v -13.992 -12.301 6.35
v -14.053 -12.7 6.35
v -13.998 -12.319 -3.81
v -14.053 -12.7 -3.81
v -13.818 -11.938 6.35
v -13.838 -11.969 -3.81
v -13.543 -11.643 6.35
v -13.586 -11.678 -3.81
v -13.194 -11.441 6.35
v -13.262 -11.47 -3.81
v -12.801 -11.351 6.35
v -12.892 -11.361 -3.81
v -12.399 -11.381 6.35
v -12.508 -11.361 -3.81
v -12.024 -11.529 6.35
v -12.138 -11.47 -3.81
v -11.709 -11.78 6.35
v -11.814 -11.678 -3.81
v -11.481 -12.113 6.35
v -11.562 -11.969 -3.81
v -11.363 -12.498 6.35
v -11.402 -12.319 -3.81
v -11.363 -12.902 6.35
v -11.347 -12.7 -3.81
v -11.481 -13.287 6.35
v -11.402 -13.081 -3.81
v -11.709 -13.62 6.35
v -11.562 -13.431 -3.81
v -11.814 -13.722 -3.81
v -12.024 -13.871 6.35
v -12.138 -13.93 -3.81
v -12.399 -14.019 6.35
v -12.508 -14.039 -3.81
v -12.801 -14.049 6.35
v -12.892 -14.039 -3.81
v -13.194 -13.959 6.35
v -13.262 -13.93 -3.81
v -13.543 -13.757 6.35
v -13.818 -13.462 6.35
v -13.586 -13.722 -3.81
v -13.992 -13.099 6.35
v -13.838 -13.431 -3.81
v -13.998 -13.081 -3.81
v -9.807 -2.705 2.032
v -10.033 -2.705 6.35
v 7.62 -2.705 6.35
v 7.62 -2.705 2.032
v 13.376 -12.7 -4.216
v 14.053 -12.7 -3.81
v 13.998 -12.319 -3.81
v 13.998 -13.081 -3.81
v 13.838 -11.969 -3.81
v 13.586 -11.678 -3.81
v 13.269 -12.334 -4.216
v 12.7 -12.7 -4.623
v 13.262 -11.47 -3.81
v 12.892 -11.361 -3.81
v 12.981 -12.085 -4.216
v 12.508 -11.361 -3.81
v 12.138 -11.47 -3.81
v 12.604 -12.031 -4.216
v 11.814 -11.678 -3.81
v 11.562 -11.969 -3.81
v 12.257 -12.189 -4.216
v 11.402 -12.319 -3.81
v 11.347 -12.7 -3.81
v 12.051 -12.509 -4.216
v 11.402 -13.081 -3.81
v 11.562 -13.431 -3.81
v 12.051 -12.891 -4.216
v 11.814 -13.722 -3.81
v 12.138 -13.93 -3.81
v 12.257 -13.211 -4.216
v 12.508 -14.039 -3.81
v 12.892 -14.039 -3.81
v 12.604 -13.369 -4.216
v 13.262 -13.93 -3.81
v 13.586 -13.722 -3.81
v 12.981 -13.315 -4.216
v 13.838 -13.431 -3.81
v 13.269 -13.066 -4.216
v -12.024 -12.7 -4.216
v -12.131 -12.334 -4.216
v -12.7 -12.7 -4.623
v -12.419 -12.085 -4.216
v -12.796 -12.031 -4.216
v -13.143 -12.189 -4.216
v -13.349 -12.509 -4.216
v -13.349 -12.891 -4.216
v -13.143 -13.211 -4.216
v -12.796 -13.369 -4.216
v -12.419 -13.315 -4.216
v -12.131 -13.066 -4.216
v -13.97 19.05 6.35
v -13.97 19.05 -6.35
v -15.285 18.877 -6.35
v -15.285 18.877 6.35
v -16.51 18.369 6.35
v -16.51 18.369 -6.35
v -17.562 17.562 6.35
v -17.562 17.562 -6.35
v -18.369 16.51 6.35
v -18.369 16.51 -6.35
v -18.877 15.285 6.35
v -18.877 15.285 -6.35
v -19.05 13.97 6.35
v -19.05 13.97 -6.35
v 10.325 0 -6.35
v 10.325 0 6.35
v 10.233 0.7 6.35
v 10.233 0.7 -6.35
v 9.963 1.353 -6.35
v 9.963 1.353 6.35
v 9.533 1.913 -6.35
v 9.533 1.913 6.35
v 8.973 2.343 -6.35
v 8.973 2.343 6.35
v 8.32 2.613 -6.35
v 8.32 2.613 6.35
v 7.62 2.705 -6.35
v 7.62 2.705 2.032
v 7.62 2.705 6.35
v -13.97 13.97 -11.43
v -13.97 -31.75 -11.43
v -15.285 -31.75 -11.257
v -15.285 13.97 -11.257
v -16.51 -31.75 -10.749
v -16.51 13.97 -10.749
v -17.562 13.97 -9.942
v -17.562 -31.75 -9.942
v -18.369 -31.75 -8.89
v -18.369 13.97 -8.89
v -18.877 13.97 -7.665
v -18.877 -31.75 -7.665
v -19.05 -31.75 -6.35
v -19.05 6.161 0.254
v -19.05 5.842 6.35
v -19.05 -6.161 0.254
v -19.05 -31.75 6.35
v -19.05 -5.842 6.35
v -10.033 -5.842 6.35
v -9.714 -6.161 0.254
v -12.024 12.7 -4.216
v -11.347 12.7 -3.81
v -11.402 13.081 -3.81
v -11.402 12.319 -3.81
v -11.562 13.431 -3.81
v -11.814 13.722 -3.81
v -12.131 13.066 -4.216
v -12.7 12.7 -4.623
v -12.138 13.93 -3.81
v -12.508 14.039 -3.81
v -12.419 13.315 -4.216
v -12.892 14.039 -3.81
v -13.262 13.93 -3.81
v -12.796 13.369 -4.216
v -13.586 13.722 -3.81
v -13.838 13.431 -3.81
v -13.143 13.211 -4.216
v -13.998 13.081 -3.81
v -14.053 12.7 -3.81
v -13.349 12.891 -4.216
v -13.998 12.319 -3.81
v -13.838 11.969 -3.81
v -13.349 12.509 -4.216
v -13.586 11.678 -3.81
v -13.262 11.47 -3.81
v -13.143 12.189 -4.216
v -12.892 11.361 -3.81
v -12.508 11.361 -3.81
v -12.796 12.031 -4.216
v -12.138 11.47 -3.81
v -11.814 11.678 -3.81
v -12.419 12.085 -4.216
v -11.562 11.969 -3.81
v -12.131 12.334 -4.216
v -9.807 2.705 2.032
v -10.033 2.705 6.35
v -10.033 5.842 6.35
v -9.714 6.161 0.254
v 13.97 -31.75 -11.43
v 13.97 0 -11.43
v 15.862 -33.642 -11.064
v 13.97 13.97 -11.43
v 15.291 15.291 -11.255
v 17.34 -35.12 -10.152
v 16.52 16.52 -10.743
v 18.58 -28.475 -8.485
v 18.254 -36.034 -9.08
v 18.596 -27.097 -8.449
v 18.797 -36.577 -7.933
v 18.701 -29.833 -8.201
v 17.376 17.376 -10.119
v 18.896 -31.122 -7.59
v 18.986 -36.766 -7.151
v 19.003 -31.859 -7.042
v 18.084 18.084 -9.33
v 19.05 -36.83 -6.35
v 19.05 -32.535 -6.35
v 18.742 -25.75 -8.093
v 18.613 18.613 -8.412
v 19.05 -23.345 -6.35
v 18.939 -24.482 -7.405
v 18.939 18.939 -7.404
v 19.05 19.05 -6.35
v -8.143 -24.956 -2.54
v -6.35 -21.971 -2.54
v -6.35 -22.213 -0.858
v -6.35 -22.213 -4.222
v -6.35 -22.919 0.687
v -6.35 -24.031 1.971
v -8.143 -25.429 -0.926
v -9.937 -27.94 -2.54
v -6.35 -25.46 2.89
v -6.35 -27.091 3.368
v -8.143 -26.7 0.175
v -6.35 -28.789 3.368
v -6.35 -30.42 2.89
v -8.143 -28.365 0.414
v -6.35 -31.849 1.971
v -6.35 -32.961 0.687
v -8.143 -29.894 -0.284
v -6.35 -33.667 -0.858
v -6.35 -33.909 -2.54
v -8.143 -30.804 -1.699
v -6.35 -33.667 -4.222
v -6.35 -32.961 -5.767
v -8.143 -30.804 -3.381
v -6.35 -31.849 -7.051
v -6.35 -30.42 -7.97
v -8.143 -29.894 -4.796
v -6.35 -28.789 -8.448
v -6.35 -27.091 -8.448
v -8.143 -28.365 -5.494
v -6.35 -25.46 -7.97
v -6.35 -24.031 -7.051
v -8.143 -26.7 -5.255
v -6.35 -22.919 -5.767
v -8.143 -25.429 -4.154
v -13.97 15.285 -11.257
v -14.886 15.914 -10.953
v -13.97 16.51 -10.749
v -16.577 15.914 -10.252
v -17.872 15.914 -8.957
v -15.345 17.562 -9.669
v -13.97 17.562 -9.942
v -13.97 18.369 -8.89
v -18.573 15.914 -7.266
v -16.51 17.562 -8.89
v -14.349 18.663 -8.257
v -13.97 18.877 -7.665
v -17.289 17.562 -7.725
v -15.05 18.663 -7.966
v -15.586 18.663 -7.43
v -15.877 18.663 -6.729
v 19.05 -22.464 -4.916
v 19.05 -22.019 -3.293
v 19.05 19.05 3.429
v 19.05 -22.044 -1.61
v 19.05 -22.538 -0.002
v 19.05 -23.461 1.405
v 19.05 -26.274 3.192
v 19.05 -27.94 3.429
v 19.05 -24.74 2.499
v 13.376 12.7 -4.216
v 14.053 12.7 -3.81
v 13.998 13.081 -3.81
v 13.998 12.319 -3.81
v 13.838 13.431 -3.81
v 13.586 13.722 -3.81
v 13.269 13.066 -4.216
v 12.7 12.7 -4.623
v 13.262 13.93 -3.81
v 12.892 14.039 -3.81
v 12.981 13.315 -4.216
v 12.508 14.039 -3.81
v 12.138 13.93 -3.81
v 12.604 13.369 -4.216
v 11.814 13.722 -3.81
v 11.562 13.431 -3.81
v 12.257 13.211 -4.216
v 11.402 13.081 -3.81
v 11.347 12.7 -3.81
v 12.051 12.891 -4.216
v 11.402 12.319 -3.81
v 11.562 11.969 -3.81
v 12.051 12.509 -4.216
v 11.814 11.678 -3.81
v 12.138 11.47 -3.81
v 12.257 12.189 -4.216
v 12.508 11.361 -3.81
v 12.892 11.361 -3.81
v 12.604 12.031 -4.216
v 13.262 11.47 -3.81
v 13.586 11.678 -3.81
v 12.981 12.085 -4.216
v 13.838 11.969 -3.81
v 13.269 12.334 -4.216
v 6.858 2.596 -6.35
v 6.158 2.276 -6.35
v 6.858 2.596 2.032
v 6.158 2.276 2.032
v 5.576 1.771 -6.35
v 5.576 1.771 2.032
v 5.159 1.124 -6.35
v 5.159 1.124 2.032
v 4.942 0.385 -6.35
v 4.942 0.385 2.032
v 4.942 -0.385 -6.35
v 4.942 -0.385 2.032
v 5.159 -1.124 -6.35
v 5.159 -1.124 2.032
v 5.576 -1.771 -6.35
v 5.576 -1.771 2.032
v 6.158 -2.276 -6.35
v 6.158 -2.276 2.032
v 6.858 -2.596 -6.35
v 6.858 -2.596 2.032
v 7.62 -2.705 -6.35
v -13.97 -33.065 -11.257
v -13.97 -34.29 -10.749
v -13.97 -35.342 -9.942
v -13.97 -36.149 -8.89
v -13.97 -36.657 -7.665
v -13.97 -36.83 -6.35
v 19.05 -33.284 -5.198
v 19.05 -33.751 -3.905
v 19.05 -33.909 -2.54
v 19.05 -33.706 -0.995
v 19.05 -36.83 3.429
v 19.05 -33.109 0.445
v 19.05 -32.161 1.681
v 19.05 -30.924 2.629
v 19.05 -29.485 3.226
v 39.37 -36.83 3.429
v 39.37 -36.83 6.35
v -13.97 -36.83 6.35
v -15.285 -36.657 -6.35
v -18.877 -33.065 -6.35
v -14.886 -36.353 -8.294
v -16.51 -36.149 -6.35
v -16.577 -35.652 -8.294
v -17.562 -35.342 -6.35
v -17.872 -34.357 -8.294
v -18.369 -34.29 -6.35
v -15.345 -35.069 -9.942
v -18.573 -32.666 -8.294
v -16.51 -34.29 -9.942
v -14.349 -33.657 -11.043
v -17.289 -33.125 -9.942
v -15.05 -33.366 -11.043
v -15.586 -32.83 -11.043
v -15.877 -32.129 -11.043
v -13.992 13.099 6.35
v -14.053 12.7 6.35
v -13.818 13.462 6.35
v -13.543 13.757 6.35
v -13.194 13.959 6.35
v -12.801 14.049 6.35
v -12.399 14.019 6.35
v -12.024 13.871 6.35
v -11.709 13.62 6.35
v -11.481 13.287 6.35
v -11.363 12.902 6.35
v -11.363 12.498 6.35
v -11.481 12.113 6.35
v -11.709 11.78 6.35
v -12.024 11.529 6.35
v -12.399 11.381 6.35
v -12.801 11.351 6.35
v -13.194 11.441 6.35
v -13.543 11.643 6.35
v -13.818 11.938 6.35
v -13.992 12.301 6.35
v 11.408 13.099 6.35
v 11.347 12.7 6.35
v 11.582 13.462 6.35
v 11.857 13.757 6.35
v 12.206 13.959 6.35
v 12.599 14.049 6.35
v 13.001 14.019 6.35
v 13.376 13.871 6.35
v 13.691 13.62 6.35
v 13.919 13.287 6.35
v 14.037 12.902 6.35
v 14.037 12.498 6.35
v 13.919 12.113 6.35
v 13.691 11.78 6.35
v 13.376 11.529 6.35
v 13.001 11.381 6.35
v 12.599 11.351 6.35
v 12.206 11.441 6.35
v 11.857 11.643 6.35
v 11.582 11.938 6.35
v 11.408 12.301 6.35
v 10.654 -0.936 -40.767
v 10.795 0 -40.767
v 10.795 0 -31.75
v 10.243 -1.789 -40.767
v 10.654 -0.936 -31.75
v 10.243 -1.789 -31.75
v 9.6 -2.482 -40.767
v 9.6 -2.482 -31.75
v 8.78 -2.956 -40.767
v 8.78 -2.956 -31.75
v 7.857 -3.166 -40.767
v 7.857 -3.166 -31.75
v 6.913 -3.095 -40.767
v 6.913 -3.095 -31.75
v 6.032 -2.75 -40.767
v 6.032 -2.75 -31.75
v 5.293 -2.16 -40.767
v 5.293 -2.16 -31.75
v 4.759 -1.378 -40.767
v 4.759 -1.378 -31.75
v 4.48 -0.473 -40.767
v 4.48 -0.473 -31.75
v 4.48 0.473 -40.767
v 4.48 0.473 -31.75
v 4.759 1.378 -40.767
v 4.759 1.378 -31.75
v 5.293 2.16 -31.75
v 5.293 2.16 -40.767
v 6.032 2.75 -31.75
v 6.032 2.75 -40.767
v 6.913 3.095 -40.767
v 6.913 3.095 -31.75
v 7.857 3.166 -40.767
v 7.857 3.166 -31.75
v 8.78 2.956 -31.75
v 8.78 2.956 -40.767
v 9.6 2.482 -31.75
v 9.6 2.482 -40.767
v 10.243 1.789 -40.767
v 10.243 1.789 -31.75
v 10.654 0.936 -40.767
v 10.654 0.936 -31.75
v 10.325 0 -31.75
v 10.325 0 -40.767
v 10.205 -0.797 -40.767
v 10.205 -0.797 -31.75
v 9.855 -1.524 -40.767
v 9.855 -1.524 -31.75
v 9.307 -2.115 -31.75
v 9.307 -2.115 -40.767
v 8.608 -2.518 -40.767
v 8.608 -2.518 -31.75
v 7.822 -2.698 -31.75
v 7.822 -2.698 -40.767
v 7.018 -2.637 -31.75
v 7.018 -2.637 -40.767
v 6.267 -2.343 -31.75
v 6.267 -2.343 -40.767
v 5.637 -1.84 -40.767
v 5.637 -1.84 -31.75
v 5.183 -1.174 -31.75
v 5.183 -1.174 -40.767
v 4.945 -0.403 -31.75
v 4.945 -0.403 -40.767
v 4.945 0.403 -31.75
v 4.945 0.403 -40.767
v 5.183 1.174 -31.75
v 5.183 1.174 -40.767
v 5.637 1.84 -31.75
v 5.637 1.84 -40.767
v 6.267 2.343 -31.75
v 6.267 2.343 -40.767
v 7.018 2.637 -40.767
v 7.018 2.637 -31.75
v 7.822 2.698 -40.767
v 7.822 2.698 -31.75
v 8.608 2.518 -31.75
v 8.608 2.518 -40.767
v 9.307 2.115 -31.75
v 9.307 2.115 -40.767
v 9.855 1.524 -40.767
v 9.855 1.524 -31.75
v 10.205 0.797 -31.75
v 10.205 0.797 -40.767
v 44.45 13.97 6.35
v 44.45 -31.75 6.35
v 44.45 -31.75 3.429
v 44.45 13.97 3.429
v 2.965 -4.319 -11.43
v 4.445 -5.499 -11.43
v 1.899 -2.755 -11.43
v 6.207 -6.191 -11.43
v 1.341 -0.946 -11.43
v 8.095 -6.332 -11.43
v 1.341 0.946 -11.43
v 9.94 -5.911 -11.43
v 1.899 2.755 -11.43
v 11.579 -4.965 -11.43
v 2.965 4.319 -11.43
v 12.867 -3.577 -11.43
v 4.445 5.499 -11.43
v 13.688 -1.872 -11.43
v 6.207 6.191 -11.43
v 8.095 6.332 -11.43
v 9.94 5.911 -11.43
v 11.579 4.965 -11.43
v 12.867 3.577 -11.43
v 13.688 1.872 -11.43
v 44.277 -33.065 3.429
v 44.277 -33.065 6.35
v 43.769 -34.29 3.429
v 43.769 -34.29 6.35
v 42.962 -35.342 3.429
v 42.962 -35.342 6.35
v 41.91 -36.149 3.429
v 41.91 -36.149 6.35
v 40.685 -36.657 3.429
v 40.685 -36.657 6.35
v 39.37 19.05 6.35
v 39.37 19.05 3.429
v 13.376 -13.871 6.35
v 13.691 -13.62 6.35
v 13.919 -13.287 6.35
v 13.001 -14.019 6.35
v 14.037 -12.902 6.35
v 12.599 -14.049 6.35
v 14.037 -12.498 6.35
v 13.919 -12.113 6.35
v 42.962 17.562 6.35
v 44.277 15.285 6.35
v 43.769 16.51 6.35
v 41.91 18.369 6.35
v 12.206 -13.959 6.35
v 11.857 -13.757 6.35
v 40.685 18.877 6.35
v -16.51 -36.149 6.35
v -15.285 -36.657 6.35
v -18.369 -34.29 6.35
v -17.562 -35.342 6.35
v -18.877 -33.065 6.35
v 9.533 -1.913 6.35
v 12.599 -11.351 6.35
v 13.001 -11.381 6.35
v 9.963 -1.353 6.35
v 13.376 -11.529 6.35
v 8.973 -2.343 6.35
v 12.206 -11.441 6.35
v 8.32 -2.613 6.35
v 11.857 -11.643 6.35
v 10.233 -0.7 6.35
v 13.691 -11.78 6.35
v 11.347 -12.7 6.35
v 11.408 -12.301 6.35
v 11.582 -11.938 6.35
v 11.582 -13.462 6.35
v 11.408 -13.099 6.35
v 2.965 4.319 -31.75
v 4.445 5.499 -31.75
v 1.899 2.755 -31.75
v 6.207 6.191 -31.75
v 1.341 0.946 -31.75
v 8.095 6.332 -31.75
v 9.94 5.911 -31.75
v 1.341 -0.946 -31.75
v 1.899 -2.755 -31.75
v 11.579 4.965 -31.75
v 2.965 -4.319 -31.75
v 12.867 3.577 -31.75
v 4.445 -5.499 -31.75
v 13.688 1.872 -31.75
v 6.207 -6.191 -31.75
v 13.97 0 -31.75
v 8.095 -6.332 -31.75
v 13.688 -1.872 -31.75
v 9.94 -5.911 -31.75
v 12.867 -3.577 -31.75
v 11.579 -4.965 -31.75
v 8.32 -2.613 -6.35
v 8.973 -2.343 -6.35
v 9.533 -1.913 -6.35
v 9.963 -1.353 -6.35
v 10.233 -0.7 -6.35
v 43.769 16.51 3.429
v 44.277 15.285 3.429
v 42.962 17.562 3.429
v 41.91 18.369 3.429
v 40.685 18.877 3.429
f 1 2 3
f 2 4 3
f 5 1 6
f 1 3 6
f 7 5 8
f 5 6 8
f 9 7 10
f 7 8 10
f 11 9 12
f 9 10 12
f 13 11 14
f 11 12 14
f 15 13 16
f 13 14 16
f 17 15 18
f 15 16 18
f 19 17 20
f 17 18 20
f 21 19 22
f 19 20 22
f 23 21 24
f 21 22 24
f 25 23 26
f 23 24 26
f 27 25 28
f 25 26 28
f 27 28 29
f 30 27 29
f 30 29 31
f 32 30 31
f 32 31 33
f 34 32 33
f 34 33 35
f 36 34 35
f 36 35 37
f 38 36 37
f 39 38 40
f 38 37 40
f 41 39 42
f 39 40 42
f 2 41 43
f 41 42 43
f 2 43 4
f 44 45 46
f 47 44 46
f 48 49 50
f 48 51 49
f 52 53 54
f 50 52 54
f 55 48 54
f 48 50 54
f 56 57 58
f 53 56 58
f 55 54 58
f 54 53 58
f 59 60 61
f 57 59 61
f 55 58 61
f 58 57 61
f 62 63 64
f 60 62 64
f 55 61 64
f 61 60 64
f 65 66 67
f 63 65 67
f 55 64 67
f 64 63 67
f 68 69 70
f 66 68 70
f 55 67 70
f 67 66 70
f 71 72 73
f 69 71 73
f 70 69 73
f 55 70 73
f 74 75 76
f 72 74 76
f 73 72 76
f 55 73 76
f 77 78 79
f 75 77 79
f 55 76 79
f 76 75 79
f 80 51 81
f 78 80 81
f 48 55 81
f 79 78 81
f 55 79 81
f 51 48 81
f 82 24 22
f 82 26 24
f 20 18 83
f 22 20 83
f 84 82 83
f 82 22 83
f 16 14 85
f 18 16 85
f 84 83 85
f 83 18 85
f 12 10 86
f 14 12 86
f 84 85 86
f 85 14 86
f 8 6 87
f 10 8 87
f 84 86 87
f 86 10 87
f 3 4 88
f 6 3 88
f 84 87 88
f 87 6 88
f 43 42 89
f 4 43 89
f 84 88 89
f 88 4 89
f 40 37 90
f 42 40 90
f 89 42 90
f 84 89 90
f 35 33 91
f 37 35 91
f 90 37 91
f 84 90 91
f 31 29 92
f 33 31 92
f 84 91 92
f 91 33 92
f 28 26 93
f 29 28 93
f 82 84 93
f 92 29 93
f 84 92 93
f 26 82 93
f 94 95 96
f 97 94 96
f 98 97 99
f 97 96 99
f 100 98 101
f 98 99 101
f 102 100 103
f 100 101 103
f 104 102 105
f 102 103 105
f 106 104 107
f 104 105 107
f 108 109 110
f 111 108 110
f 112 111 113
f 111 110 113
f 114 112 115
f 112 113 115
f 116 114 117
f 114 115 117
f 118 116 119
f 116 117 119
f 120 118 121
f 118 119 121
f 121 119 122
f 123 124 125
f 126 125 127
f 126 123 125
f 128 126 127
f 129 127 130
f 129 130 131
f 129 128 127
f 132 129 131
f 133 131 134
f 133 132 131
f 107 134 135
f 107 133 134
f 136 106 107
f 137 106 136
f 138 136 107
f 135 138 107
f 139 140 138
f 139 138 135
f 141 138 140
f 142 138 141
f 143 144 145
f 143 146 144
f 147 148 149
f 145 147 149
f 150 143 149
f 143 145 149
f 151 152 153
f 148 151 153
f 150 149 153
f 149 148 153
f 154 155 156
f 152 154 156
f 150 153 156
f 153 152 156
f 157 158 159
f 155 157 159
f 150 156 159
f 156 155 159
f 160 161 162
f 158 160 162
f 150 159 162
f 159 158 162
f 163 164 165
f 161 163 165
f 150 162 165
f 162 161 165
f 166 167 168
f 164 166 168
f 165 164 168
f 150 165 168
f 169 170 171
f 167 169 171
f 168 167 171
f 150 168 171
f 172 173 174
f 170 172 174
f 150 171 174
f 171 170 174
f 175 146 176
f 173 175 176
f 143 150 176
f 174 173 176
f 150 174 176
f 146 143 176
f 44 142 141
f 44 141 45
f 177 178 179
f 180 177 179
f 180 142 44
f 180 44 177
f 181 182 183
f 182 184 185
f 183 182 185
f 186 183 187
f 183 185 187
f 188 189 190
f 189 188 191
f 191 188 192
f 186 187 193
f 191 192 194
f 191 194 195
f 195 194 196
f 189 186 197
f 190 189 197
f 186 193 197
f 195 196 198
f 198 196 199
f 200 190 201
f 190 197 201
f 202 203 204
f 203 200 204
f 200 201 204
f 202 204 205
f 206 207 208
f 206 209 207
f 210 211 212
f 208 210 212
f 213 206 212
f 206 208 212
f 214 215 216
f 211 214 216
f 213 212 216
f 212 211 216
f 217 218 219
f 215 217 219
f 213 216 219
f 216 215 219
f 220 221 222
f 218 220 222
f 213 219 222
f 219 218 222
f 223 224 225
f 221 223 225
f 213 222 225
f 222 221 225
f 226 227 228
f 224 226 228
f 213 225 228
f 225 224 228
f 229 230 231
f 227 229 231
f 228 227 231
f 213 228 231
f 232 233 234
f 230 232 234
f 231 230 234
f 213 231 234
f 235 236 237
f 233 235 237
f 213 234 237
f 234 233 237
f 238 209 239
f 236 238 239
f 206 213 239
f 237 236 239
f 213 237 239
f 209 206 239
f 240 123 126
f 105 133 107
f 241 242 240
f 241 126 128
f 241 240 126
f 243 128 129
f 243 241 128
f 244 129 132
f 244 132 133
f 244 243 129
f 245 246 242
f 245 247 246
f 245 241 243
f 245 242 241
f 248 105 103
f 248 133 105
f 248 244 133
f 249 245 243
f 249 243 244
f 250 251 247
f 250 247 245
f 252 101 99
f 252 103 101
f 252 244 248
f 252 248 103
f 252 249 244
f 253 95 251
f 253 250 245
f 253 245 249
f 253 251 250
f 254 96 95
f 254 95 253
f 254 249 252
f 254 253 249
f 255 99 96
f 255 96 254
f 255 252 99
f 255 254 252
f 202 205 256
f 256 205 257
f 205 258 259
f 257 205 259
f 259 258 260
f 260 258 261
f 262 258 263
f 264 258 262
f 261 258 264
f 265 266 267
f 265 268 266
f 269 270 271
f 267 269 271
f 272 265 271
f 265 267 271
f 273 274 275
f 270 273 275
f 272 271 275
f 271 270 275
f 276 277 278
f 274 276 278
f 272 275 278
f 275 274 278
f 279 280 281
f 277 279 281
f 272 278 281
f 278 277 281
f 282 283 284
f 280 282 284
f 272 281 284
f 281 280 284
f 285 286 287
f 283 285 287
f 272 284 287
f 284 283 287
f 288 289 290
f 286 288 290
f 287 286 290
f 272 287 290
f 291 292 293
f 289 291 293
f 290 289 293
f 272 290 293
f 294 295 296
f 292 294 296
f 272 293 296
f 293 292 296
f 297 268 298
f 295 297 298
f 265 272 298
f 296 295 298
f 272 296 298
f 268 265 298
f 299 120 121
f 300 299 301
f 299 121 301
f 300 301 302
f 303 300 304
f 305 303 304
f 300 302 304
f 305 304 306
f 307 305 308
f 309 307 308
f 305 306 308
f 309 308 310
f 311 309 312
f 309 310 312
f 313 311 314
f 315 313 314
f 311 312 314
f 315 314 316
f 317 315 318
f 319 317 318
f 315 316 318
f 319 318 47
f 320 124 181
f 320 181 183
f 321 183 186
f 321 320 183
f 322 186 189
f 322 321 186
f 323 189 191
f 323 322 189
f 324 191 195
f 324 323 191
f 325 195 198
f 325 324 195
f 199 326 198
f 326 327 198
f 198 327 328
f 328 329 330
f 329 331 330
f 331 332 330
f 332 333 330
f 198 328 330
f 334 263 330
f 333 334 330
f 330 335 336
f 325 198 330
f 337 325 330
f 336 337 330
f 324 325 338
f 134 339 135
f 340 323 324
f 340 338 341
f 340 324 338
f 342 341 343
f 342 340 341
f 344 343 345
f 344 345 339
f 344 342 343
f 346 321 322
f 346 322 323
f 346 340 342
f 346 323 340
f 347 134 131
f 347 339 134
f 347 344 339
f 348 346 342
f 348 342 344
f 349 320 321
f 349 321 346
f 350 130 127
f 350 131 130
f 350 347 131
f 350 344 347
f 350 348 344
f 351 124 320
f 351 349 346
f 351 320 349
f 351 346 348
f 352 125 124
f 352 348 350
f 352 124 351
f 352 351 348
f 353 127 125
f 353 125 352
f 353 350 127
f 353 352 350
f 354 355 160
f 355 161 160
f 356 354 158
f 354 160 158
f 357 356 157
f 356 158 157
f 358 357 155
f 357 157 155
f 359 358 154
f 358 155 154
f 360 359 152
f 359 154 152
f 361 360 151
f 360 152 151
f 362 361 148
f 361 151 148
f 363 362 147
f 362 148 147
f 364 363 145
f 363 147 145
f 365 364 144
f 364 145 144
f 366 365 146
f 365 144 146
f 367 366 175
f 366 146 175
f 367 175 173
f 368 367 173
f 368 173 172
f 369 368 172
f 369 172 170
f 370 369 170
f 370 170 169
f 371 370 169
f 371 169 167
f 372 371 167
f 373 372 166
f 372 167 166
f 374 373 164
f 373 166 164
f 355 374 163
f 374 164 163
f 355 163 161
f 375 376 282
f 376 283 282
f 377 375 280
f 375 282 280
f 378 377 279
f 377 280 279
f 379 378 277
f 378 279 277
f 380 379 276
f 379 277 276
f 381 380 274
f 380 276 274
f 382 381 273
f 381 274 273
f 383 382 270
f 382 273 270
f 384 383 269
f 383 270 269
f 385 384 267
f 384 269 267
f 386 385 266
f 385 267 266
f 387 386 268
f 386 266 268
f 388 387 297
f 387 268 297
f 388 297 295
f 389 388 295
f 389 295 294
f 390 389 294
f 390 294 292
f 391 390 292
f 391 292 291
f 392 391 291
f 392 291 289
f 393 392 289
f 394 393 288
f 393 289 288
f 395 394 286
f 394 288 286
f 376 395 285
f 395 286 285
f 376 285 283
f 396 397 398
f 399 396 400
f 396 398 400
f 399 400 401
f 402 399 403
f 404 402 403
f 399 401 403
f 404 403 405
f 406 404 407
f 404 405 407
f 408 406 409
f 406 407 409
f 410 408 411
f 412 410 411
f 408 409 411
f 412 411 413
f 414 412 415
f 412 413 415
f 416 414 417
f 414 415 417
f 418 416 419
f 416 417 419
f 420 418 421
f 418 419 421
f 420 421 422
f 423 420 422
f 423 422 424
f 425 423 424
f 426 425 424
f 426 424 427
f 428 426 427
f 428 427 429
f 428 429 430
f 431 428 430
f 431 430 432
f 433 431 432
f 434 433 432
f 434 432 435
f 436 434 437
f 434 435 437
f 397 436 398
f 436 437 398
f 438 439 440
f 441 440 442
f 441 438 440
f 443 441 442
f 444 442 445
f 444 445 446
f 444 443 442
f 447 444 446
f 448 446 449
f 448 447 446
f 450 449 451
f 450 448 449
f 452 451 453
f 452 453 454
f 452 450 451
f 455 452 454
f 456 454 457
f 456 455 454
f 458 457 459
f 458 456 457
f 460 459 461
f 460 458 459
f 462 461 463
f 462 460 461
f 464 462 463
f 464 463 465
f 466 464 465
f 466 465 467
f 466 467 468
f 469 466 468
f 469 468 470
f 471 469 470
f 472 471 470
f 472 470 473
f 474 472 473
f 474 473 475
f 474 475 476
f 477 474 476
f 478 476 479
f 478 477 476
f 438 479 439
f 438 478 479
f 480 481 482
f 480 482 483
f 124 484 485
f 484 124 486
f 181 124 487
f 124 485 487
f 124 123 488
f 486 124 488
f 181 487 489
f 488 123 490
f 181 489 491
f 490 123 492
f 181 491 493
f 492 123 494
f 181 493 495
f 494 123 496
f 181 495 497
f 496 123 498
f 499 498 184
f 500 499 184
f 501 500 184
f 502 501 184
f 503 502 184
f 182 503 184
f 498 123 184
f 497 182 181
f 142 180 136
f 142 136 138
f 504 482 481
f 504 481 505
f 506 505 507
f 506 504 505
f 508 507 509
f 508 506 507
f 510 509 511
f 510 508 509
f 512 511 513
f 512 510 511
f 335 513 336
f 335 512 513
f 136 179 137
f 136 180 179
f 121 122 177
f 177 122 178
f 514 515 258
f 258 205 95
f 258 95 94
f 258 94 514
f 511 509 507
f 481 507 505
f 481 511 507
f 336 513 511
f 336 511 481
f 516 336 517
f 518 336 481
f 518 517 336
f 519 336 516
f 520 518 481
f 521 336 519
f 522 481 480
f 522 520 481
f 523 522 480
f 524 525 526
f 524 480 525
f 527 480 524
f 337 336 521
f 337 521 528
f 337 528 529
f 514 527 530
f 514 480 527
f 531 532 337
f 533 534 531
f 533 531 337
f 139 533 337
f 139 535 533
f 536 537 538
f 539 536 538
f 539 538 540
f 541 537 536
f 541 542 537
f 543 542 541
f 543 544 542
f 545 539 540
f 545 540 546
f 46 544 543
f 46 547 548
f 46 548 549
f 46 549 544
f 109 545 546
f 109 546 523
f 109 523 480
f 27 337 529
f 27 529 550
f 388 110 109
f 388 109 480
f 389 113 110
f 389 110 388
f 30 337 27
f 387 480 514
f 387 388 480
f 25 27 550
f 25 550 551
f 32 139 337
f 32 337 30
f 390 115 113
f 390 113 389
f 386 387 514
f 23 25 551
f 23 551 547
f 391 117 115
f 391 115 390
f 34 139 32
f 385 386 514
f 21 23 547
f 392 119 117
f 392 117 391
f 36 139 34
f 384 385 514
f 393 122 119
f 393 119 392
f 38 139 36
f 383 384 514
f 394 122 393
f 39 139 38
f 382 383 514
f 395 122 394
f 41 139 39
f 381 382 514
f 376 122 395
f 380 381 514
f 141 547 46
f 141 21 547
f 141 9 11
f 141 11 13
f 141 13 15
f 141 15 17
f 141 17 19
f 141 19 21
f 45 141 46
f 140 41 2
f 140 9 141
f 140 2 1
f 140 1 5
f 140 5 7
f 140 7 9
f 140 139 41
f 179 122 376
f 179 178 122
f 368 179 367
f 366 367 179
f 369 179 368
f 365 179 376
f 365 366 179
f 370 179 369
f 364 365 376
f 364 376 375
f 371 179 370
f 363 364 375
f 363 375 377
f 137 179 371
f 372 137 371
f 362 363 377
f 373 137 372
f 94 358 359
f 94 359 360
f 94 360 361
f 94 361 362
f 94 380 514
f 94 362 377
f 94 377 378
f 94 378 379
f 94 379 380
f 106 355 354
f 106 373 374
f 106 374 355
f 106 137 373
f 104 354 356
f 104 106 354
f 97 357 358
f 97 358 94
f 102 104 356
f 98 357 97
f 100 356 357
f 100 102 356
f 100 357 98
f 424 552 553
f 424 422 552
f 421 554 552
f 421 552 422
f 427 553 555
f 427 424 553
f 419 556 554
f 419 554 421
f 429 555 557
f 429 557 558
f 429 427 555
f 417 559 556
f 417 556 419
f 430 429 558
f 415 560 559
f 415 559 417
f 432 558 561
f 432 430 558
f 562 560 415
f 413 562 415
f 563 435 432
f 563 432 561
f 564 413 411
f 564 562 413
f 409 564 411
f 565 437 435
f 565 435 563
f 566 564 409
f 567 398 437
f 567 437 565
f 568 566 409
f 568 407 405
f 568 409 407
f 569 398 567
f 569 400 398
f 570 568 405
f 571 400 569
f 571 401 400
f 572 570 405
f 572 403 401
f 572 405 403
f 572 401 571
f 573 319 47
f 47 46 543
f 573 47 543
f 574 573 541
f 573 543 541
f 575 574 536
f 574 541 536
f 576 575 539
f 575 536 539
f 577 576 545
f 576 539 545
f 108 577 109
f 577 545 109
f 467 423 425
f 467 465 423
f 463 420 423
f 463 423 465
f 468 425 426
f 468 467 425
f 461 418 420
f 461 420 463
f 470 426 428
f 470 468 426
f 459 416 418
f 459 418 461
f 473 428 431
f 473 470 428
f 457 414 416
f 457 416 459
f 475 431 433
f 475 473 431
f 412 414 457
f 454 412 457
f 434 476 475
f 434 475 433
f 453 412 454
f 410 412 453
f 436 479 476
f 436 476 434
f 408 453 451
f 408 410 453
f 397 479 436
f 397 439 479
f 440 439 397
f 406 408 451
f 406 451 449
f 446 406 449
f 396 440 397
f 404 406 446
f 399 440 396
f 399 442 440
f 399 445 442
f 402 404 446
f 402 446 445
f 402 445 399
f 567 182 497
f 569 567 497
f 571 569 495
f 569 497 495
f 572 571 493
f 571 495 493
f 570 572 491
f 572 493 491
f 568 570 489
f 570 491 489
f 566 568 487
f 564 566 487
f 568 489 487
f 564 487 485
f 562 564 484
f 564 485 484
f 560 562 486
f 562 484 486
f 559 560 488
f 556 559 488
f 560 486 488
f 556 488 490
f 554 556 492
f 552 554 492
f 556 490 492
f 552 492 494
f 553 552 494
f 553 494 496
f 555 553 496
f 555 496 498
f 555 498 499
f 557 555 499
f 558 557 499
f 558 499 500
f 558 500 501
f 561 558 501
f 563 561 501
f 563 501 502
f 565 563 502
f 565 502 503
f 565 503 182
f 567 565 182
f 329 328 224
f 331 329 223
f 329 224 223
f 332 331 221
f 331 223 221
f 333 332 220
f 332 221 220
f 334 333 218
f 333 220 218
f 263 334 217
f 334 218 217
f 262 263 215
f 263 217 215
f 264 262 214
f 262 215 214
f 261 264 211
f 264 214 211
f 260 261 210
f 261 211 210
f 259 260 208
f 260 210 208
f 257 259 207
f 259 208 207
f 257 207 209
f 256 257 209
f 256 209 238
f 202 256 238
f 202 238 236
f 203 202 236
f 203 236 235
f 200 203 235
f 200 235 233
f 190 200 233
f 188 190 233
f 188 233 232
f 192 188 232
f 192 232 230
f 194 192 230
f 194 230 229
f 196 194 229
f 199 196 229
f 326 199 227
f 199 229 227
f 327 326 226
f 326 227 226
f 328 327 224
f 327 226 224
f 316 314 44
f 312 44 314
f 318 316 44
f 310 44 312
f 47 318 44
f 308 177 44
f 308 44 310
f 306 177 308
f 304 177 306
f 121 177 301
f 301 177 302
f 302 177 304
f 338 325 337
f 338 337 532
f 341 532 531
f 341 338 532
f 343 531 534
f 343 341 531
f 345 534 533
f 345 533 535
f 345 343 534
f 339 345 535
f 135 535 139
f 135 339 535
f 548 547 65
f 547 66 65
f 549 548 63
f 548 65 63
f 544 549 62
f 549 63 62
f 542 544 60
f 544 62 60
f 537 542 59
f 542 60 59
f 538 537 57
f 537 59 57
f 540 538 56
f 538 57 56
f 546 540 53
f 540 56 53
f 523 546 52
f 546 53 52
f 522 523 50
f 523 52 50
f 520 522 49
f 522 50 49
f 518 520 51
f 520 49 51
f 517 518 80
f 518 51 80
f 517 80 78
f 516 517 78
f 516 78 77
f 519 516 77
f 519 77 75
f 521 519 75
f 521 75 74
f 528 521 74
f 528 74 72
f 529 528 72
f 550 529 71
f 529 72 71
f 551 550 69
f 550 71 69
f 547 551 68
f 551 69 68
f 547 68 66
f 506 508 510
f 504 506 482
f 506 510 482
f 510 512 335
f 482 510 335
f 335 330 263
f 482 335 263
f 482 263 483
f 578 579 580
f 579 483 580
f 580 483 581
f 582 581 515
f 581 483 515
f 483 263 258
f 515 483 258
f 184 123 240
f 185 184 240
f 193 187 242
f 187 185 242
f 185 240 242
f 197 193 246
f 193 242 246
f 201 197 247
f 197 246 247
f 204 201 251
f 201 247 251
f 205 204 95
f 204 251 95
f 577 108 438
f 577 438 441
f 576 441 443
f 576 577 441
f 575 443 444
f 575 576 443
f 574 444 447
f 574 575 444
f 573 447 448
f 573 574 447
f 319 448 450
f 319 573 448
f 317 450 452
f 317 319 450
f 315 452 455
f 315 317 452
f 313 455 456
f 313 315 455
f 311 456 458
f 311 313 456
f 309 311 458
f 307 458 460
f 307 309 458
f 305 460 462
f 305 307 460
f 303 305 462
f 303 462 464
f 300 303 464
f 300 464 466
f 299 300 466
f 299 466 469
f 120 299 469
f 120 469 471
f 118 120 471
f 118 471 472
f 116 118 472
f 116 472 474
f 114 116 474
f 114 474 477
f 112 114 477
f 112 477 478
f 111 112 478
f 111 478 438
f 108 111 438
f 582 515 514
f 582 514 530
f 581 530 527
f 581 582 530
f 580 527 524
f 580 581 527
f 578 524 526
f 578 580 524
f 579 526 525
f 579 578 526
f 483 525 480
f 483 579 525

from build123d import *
from build123d import SkipClean  # not in build123d's __all__

# Parameters (mm, degrees)
F0_W          = 38.1
F0_H          = 12.7
F1_DEPTH      = 19.05
F2_W          = 9.017
F2_H          = 3.1369
F2_H_2        = 5.4102
F3_DEPTH      = 6.096
F3_TAPER      = -3
F4_DEPTH      = 4.318
F5_DEPTH      = 12.7010001
F7_R          = 6.35
F7_R_2        = 2.7051
F8_DEPTH      = 25.4
F9_R          = 3.175
F9_R_2        = 2.7051
F10_DEPTH     = 9.017
F11_DEPTH     = 17.78
F12_DEPTH     = 5.08
F14_D         = 11.938
F14_DEPTH     = 25.4
F14_TIP       = 3.586537035
F15_W         = 55.88
F15_H         = 2.921
F16_DEPTH     = 25.4
F17_T1_DEPTH  = 25.4
F17_T3_DEPTH  = 28.321
F17_T5_DEPTH  = 45.72
F17_T7_DEPTH  = 45.72
F17_T9_DEPTH  = 81.28
F17_S13_W     = 5.08
F17_S13_H     = 5.08
F17_T14_DEPTH = 5.08
F17_S19_W     = 5.08
F17_S19_H     = 5.08
F17_T20_DEPTH = 5.08
F18_D         = 2.7051
F18_DEPTH     = 10.16
F18_TIP       = 0.8126940303


# Not quite as in the source:
# - a fillet or chamfer that OpenCascade refuses, or shapes differently, is made with other operations: its cross-section is extruded or revolved along the edge and cut away or added
# - after a boolean that leaves OpenCascade's solid faulty, fix() repairs it


with BuildPart() as f1:
    # F0 (on Front) → F1 (new body, symmetric)
    with BuildSketch(Plane.XZ):
        Rectangle(F0_W, F0_H)
    extrude(amount=F1_DEPTH, both=True)

    # F2 (on face) → F3 (cut)
    with BuildSketch(Plane.XY.offset(6.35)):
        with Locations((-14.5415, 4.27355)):
            Rectangle(F2_W, F2_H)
        with Locations((-14.5415, 0)):
            Rectangle(F2_W, F2_H_2)
        with Locations((-14.5415, -4.27355)):
            Rectangle(F2_W, F2_H)
    extrude(amount=-F3_DEPTH, taper=F3_TAPER, mode=Mode.SUBTRACT)

    # F2 (on face) → F4 (cut)
    with BuildSketch(Plane.XY.offset(6.35)):
        with Locations((-14.5415, 4.27355)):
            Rectangle(F2_W, F2_H)
        with Locations((-14.5415, -4.27355)):
            Rectangle(F2_W, F2_H)
        with BuildLine():
            Line((7.62, 2.7051), (1.8750079208, 2.7051))
            ThreePointArc((1.8750079208, 2.7051), (1.27, 0), (1.8750079208, -2.7051))
            Line((1.8750079208, -2.7051), (7.62, -2.7051))
            ThreePointArc((7.62, -2.7051), (4.9149, 0), (7.62, 2.7051))
        make_face()
        with BuildLine():
            ThreePointArc((1.8750079208, -2.7051), (1.27, 0), (1.8750079208, 2.7051))
            Line((1.8750079208, 2.7051), (-10.033, 2.7051))
            Line((-10.033, 2.7051), (-10.033, -2.7051))
            Line((-10.033, -2.7051), (1.8750079208, -2.7051))
        make_face()
        with Locations((-14.5415, 0)):
            Rectangle(F2_W, F2_H_2)
    extrude(amount=-F4_DEPTH, mode=Mode.SUBTRACT)

    # F2 (on face) → F5 (cut, through all)
    with BuildSketch(Plane.XY.offset(6.35)):
        with BuildLine():
            ThreePointArc((10.3251, 0), (9.5327945538, 1.9127945538), (7.62, 2.7051))
            ThreePointArc((7.62, 2.7051), (4.9149, 0), (7.62, -2.7051))
            ThreePointArc((7.62, -2.7051), (9.5327945538, -1.9127945538), (10.3251, 0))
        make_face()
    extrude(amount=-F5_DEPTH, mode=Mode.SUBTRACT)

    # F7 (on face) → F8 (join)
    with BuildSketch(Plane(origin=(0, 0, -6.35), x_dir=(1, 0, 0), z_dir=(0, 0, -1))):
        with Locations((7.62, 0)):
            Circle(F7_R)
        with Locations((7.62, 0)):
            Circle(F7_R_2, mode=Mode.SUBTRACT)
    with SkipClean():  # cleaning this boolean's faces spoils the solid; the shape is the same uncleaned
        extrude(amount=F8_DEPTH)

    # F9 (on face) → F10 (join)
    with BuildSketch(Plane(origin=(0, 0, -31.75), x_dir=(1, 0, 0), z_dir=(0, 0, -1))):
        with Locations((7.62, 0)):
            Circle(F9_R)
        with Locations((7.62, 0)):
            Circle(F9_R_2, mode=Mode.SUBTRACT)
    extrude(amount=F10_DEPTH)

    add(f1.part.fix(), mode=Mode.REPLACE)

    # F11 (add): a face of the model
    f11_faces = [f1.faces().sort_by_distance(p)[0] for p in [
        (0, -19.05, 0),
    ]]
    extrude(f11_faces, amount=F11_DEPTH)

    # F12 (add): faces of the model
    f12_faces = [f1.faces().sort_by_distance(p)[0] for p in [
        (-0.7285482759, 0, -6.35),
        (0, -27.94, -6.35),
    ]]
    extrude(f12_faces, amount=F12_DEPTH)

    # F14
    with Locations(Plane.YZ.offset(19.05)):
        with Locations((-27.94, -2.54)):
            Hole(F14_D / 2, depth=F14_DEPTH)
            with Locations((0, 0, -(F14_DEPTH + F14_TIP / 2))):  # 118° drill point
                Cone(0, F14_D / 2, F14_TIP, mode=Mode.SUBTRACT)

    # F15 (on face) → F16 (join)
    with BuildSketch(Plane.YZ.offset(19.05)):
        with Locations((-8.89, 4.8895)):
            Rectangle(F15_W, F15_H)
    extrude(amount=F16_DEPTH)

    # F17: fillet of radius 5.08 on 8 edges, made by hand

    # F17_s2 → F17_t1 (cut)
    with BuildSketch(Plane.XY.offset(-6.35)):
        with BuildLine():
            ThreePointArc((-13.97, -36.83), (-17.5621024484, -35.3421024484), (-19.05, -31.75))
            Line((-19.05, -31.75), (-19.05, -36.83))
            Line((-19.05, -36.83), (-13.97, -36.83))
        make_face()
        with BuildLine():
            ThreePointArc((-13.97, 19.05), (-17.5621024484, 17.5621024484), (-19.05, 13.97))
            Line((-19.05, 13.97), (-19.05, 19.05))
            Line((-19.05, 19.05), (-13.97, 19.05))
        make_face()
    extrude(amount=F17_T1_DEPTH, mode=Mode.SUBTRACT)

    # F17_s4 → F17_t3 (cut)
    with BuildSketch(Plane.XY.offset(-9.271)):
        with BuildLine():
            ThreePointArc((39.37, 19.05), (42.9621024484, 17.5621024484), (44.45, 13.97))
            Line((44.45, 13.97), (44.45, 19.05))
            Line((44.45, 19.05), (39.37, 19.05))
        make_face()
        with BuildLine():
            ThreePointArc((44.45, -31.75), (42.9621024484, -35.3421024484), (39.37, -36.83))
            Line((39.37, -36.83), (44.45, -36.83))
            Line((44.45, -36.83), (44.45, -31.75))
        make_face()
    extrude(amount=F17_T3_DEPTH, mode=Mode.SUBTRACT)

    # F17_s6 → F17_t5 (cut)
    with BuildSketch(Plane.XZ.offset(-13.97)):
        with BuildLine():
            ThreePointArc((-13.97, -11.43), (-17.5621024484, -9.9421024484), (-19.05, -6.35))
            Line((-19.05, -6.35), (-19.05, -11.43))
            Line((-19.05, -11.43), (-13.97, -11.43))
        make_face()
    extrude(amount=F17_T5_DEPTH, mode=Mode.SUBTRACT)

    # F17_s8 → F17_t7 (cut)
    with BuildSketch(Plane.YZ.offset(-13.97)):
        with BuildLine():
            ThreePointArc((-31.75, -11.43), (-35.3421024484, -9.9421024484), (-36.83, -6.35))
            Line((-36.83, -6.35), (-36.83, -11.43))
            Line((-36.83, -11.43), (-31.75, -11.43))
        make_face()
        with BuildLine():
            ThreePointArc((13.97, -11.43), (17.5621024484, -9.9421024484), (19.05, -6.35))
            Line((19.05, -6.35), (19.05, -11.43))
            Line((19.05, -11.43), (13.97, -11.43))
        make_face()
    extrude(amount=F17_T7_DEPTH, mode=Mode.SUBTRACT)

    # F17_s10 → F17_t9 (cut)
    with BuildSketch(Plane.XZ.offset(-31.75)):
        with BuildLine():
            ThreePointArc((13.97, -11.43), (17.5621024484, -9.9421024484), (19.05, -6.35))
            Line((19.05, -6.35), (19.05, -11.43))
            Line((19.05, -11.43), (13.97, -11.43))
        make_face()
    extrude(amount=F17_T9_DEPTH, mode=Mode.SUBTRACT)


with BuildPart() as f17_tool12:
    # F17_s13 → F17_t14 (new body)
    with BuildSketch(Plane.XY.offset(-6.35)):
        with Locations((-16.51, -34.29)):
            Rectangle(F17_S13_W, F17_S13_H)
    extrude(amount=-F17_T14_DEPTH)

    # F17_s15 → F17_t16 (revolve, cut)
    with BuildSketch(Plane(origin=(-13.97, -31.75, -6.35), x_dir=(0.7071067812, 0.7071067812, 0), z_dir=(-0.7071067812, 0.7071067812, 0))):
        with BuildLine():
            ThreePointArc((0, -5.08), (5.08, 0), (0, 5.08))
            Line((0, 5.08), (0, -5.08))
        make_face()
    revolve(axis=Axis((-13.97, -31.75, -6.35), (0, 0, -1)), mode=Mode.SUBTRACT)


with BuildPart() as f1_1:
    add(f1.part, clean=False)

    # F17_t11: cut F17_tool12
    add(f17_tool12.part, mode=Mode.SUBTRACT)


with BuildPart() as f17_tool18:
    # F17_s19 → F17_t20 (new body)
    with BuildSketch(Plane.XZ.offset(-13.97)):
        with Locations((-16.51, -8.89)):
            Rectangle(F17_S19_W, F17_S19_H)
    extrude(amount=-F17_T20_DEPTH)

    # F17_s21 → F17_t22 (revolve, cut)
    with BuildSketch(Plane(origin=(-13.97, 13.97, -6.35), x_dir=(0.7071067812, 0, 0.7071067812), z_dir=(-0.7071067812, 0, 0.7071067812))):
        with BuildLine():
            ThreePointArc((0, -5.08), (5.08, 0), (0, 5.08))
            Line((0, 5.08), (0, -5.08))
        make_face()
    revolve(axis=Axis((-13.97, 13.97, -6.35), (0, 1, 0)), mode=Mode.SUBTRACT)


with BuildPart() as f1_2:
    add(f1_1.part, clean=False)

    # F17_t17: cut F17_tool18
    add(f17_tool18.part, mode=Mode.SUBTRACT)

    # F18
    with Locations(Plane.XY.offset(6.35)):
        with Locations((-12.7, 12.7), (-12.7, -12.7), (12.7, -12.7), (12.7, 12.7)):
            Hole(F18_D / 2, depth=F18_DEPTH)
            with Locations((0, 0, -(F18_DEPTH + F18_TIP / 2))):  # 118° drill point
                Cone(0, F18_D / 2, F18_TIP, mode=Mode.SUBTRACT)


solid = f1_2.part
